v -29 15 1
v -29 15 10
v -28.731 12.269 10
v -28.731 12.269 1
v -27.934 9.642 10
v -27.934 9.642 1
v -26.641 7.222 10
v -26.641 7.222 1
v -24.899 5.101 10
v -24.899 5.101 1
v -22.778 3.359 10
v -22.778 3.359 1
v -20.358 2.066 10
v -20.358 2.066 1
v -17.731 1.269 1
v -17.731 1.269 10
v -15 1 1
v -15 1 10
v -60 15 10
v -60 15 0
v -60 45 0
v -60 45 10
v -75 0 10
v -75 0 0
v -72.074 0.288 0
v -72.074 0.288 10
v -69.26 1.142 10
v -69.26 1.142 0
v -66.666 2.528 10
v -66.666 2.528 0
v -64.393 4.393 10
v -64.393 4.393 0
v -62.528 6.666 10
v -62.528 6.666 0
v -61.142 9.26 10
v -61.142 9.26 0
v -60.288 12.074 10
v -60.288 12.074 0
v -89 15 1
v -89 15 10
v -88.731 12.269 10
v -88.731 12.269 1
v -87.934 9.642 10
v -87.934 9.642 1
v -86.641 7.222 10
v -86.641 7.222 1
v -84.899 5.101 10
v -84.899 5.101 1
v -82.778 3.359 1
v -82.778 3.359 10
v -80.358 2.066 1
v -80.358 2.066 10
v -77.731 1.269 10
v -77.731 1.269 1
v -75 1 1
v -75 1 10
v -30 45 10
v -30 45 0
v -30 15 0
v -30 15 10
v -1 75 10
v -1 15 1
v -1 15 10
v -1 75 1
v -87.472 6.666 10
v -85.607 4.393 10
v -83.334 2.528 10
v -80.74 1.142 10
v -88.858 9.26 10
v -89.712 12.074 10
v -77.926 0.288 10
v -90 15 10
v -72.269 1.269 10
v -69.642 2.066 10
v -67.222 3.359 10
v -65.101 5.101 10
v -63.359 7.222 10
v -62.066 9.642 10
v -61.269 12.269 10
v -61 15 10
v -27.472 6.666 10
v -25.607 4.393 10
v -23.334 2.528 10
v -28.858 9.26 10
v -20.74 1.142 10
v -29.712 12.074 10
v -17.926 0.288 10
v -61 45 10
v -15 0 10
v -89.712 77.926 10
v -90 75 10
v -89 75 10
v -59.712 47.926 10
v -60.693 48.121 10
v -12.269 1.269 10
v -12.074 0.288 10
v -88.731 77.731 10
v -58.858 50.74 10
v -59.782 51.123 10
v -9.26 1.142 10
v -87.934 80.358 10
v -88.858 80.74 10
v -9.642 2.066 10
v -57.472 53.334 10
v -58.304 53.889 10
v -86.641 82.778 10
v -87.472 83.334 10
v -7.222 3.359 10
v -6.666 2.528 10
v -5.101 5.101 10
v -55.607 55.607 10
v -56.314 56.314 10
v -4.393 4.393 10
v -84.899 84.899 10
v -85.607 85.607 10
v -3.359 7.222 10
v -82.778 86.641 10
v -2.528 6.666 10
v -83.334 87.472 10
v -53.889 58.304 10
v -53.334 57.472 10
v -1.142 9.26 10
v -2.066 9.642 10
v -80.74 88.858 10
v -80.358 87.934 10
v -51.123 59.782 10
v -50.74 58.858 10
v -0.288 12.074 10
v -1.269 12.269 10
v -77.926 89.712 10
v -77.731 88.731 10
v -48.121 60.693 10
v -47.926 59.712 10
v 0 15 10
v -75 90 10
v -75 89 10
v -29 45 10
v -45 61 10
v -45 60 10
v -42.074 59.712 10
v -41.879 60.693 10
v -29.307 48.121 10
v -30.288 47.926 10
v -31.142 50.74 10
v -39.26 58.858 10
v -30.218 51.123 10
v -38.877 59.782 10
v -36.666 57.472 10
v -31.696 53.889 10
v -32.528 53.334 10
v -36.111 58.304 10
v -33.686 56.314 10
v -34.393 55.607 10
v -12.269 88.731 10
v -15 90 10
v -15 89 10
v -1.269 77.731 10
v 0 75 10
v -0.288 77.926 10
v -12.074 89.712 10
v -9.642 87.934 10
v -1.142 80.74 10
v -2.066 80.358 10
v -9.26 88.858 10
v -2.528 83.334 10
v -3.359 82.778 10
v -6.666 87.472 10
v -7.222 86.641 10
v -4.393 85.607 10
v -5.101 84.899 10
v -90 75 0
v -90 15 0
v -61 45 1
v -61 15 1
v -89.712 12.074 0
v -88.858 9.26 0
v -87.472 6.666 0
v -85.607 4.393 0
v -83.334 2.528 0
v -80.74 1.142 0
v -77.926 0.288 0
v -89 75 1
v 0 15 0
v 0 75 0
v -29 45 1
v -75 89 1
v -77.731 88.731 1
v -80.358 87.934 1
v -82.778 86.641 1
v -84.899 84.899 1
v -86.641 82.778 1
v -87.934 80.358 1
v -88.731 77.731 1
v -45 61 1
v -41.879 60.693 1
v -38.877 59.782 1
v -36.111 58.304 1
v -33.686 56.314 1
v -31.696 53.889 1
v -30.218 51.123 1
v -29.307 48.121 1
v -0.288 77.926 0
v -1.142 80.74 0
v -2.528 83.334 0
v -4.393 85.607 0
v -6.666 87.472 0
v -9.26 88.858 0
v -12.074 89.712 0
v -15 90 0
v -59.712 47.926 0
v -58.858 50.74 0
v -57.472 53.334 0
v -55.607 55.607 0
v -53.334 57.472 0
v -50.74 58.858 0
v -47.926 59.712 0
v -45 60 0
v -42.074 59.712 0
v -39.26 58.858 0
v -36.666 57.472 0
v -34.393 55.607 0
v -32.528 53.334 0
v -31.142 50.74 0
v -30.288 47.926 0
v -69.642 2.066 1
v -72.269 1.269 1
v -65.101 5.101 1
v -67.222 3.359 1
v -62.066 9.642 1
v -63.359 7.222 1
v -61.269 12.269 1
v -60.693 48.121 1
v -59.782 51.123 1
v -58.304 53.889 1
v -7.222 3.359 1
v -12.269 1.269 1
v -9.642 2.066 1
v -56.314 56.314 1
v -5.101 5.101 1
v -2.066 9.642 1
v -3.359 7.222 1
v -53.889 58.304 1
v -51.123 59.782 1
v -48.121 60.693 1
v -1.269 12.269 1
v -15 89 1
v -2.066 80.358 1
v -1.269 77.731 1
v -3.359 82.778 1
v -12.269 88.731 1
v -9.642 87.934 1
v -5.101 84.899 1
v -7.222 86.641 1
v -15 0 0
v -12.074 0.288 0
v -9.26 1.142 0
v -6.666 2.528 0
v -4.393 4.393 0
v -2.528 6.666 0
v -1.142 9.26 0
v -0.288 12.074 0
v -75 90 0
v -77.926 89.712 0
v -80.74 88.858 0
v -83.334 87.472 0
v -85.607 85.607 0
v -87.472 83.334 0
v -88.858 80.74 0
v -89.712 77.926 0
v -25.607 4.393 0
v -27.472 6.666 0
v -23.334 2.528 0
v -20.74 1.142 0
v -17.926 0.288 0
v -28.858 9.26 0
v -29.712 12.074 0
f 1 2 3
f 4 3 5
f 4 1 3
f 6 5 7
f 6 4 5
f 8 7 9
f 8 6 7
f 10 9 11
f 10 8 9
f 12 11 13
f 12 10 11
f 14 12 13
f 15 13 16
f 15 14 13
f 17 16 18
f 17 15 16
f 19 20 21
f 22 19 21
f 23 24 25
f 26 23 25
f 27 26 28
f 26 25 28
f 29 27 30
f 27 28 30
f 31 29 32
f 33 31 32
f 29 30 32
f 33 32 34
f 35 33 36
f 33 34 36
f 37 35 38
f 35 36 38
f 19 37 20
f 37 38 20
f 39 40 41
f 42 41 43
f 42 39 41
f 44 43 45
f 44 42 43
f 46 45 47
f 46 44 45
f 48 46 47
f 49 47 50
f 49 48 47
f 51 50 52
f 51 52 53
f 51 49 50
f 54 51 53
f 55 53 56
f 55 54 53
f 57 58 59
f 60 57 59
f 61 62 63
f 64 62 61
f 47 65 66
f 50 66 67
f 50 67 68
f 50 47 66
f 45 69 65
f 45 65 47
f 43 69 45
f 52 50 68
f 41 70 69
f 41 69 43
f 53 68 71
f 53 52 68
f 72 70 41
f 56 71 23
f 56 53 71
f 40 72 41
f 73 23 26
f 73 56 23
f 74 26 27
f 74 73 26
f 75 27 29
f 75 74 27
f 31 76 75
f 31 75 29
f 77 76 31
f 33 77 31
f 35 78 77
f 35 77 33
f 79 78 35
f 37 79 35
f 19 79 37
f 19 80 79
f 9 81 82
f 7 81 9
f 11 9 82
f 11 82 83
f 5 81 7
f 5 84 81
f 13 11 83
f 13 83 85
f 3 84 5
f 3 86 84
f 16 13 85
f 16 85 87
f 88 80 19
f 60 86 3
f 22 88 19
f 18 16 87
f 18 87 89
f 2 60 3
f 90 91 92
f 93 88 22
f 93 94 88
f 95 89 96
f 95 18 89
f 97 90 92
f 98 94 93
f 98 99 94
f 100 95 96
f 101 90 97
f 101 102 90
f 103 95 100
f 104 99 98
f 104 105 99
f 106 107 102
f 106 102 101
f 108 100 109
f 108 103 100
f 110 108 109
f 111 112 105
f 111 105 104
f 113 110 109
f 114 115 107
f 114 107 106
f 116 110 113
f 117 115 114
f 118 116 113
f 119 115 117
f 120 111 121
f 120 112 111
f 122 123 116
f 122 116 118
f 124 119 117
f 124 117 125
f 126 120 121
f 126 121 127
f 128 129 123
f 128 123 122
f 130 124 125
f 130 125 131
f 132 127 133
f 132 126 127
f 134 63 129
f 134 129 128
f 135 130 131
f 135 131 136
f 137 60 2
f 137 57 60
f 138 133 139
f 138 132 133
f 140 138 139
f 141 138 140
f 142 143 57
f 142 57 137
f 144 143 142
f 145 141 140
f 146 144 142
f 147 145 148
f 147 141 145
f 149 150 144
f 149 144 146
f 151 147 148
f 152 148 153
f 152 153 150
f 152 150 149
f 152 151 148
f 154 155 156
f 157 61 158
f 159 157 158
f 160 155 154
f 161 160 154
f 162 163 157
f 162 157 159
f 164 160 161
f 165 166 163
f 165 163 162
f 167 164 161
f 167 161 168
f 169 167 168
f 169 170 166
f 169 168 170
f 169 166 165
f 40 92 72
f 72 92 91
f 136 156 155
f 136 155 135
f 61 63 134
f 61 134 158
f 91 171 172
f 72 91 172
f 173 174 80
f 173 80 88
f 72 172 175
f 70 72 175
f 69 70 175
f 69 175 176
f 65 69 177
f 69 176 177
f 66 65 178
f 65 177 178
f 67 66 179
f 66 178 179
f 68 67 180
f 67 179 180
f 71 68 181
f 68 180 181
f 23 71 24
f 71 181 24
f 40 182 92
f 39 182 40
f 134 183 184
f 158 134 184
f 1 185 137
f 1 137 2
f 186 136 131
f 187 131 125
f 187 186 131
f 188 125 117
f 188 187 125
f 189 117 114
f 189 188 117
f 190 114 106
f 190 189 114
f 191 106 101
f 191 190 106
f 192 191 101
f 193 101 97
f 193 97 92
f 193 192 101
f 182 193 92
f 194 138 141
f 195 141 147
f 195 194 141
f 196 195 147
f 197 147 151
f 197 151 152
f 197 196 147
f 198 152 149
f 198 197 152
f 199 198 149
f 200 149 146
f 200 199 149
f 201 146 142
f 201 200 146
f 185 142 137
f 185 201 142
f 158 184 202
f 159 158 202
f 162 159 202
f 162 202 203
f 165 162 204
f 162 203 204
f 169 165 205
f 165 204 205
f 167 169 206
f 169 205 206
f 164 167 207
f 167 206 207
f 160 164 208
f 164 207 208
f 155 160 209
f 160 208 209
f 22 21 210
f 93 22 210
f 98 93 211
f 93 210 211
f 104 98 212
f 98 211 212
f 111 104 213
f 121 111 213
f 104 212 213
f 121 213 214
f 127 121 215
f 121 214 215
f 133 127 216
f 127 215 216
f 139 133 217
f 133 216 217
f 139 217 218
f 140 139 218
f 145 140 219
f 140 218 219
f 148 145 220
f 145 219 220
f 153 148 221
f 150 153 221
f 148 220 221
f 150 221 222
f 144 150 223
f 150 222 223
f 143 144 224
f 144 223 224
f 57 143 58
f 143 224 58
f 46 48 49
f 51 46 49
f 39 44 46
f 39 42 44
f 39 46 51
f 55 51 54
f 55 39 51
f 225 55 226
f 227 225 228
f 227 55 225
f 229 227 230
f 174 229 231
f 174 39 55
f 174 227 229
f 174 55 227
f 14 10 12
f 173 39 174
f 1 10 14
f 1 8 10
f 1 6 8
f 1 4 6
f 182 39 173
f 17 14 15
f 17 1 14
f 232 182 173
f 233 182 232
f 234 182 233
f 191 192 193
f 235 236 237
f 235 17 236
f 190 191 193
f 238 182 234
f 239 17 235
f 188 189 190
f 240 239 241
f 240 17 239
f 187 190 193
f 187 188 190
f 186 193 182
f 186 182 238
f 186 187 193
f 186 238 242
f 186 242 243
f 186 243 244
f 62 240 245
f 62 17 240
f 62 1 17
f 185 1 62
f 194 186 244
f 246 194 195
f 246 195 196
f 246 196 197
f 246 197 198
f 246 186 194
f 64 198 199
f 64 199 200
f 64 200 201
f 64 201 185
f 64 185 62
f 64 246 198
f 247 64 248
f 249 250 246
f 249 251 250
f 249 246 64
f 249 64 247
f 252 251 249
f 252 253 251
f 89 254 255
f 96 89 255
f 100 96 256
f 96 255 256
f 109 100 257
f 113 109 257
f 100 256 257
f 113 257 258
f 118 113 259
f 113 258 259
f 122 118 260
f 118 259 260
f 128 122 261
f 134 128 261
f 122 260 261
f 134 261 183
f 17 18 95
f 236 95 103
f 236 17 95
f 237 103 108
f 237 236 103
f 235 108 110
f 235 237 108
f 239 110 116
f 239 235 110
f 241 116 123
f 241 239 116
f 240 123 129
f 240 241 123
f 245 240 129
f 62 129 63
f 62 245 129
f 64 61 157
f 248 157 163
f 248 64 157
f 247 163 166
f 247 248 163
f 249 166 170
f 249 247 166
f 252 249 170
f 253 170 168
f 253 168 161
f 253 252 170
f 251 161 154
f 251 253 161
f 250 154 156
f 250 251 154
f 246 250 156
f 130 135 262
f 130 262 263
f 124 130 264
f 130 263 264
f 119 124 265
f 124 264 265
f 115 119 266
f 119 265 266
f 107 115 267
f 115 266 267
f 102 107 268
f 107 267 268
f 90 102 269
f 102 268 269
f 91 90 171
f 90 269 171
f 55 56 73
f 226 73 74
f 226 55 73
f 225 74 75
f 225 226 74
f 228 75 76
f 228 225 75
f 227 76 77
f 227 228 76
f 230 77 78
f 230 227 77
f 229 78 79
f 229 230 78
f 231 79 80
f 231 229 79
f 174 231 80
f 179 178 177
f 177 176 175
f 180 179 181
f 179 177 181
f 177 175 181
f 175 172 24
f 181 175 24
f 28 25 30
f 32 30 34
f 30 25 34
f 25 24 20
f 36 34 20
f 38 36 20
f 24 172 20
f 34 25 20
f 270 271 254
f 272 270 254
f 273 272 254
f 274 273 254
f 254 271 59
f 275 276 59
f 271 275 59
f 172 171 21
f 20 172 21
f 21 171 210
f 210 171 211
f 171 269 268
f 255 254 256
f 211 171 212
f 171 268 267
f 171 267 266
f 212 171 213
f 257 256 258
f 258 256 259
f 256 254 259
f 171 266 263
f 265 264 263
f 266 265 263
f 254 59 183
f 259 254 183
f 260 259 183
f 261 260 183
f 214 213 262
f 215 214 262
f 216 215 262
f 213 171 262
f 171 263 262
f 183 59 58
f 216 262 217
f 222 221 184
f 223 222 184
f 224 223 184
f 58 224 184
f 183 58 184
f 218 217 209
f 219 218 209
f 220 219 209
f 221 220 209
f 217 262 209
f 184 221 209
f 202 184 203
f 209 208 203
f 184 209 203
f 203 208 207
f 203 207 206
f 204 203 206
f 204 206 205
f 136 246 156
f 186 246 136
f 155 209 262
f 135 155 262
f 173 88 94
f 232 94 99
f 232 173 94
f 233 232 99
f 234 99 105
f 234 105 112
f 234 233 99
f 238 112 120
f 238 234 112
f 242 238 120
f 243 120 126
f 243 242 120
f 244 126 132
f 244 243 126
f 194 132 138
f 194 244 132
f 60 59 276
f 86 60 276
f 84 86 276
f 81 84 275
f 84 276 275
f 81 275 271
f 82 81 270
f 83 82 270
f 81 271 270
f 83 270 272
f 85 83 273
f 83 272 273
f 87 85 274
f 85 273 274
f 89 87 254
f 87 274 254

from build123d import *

# Parameters (mm, degrees)
F1_DEPTH = 10
F2_T     = -1


with BuildPart() as f1:
    # F0 (on Top) → F1 (new body)
    with BuildSketch(Plane.XY):
        with BuildLine():
            Line((-90, 75), (-90, 15))
            ThreePointArc((-90, 15), (-85.606602, 4.393398), (-75, 0))
            ThreePointArc((-75, 0), (-64.393398, 4.393398), (-60, 15))
            Line((-60, 15), (-60, 45))
            ThreePointArc((-60, 45), (-55.606602, 55.606602), (-45, 60))
            ThreePointArc((-45, 60), (-34.393398, 55.606602), (-30, 45))
            Line((-30, 45), (-30, 15))
            ThreePointArc((-30, 15), (-25.606602, 4.393398), (-15, 0))
            ThreePointArc((-15, 0), (-4.393398, 4.393398), (0, 15))
            Line((0, 15), (0, 75))
            ThreePointArc((0, 75), (-4.393398, 85.606602), (-15, 90))
            Line((-15, 90), (-75, 90))
            ThreePointArc((-75, 90), (-85.606602, 85.606602), (-90, 75))
        make_face()
    extrude(amount=F1_DEPTH)

    # F2
    f2_openings = [f1.faces().sort_by_distance(p)[0] for p in [
        (-5.293398, 84.706602, 10),
    ]]
    offset(amount=F2_T, openings=f2_openings)


solid = f1.part
